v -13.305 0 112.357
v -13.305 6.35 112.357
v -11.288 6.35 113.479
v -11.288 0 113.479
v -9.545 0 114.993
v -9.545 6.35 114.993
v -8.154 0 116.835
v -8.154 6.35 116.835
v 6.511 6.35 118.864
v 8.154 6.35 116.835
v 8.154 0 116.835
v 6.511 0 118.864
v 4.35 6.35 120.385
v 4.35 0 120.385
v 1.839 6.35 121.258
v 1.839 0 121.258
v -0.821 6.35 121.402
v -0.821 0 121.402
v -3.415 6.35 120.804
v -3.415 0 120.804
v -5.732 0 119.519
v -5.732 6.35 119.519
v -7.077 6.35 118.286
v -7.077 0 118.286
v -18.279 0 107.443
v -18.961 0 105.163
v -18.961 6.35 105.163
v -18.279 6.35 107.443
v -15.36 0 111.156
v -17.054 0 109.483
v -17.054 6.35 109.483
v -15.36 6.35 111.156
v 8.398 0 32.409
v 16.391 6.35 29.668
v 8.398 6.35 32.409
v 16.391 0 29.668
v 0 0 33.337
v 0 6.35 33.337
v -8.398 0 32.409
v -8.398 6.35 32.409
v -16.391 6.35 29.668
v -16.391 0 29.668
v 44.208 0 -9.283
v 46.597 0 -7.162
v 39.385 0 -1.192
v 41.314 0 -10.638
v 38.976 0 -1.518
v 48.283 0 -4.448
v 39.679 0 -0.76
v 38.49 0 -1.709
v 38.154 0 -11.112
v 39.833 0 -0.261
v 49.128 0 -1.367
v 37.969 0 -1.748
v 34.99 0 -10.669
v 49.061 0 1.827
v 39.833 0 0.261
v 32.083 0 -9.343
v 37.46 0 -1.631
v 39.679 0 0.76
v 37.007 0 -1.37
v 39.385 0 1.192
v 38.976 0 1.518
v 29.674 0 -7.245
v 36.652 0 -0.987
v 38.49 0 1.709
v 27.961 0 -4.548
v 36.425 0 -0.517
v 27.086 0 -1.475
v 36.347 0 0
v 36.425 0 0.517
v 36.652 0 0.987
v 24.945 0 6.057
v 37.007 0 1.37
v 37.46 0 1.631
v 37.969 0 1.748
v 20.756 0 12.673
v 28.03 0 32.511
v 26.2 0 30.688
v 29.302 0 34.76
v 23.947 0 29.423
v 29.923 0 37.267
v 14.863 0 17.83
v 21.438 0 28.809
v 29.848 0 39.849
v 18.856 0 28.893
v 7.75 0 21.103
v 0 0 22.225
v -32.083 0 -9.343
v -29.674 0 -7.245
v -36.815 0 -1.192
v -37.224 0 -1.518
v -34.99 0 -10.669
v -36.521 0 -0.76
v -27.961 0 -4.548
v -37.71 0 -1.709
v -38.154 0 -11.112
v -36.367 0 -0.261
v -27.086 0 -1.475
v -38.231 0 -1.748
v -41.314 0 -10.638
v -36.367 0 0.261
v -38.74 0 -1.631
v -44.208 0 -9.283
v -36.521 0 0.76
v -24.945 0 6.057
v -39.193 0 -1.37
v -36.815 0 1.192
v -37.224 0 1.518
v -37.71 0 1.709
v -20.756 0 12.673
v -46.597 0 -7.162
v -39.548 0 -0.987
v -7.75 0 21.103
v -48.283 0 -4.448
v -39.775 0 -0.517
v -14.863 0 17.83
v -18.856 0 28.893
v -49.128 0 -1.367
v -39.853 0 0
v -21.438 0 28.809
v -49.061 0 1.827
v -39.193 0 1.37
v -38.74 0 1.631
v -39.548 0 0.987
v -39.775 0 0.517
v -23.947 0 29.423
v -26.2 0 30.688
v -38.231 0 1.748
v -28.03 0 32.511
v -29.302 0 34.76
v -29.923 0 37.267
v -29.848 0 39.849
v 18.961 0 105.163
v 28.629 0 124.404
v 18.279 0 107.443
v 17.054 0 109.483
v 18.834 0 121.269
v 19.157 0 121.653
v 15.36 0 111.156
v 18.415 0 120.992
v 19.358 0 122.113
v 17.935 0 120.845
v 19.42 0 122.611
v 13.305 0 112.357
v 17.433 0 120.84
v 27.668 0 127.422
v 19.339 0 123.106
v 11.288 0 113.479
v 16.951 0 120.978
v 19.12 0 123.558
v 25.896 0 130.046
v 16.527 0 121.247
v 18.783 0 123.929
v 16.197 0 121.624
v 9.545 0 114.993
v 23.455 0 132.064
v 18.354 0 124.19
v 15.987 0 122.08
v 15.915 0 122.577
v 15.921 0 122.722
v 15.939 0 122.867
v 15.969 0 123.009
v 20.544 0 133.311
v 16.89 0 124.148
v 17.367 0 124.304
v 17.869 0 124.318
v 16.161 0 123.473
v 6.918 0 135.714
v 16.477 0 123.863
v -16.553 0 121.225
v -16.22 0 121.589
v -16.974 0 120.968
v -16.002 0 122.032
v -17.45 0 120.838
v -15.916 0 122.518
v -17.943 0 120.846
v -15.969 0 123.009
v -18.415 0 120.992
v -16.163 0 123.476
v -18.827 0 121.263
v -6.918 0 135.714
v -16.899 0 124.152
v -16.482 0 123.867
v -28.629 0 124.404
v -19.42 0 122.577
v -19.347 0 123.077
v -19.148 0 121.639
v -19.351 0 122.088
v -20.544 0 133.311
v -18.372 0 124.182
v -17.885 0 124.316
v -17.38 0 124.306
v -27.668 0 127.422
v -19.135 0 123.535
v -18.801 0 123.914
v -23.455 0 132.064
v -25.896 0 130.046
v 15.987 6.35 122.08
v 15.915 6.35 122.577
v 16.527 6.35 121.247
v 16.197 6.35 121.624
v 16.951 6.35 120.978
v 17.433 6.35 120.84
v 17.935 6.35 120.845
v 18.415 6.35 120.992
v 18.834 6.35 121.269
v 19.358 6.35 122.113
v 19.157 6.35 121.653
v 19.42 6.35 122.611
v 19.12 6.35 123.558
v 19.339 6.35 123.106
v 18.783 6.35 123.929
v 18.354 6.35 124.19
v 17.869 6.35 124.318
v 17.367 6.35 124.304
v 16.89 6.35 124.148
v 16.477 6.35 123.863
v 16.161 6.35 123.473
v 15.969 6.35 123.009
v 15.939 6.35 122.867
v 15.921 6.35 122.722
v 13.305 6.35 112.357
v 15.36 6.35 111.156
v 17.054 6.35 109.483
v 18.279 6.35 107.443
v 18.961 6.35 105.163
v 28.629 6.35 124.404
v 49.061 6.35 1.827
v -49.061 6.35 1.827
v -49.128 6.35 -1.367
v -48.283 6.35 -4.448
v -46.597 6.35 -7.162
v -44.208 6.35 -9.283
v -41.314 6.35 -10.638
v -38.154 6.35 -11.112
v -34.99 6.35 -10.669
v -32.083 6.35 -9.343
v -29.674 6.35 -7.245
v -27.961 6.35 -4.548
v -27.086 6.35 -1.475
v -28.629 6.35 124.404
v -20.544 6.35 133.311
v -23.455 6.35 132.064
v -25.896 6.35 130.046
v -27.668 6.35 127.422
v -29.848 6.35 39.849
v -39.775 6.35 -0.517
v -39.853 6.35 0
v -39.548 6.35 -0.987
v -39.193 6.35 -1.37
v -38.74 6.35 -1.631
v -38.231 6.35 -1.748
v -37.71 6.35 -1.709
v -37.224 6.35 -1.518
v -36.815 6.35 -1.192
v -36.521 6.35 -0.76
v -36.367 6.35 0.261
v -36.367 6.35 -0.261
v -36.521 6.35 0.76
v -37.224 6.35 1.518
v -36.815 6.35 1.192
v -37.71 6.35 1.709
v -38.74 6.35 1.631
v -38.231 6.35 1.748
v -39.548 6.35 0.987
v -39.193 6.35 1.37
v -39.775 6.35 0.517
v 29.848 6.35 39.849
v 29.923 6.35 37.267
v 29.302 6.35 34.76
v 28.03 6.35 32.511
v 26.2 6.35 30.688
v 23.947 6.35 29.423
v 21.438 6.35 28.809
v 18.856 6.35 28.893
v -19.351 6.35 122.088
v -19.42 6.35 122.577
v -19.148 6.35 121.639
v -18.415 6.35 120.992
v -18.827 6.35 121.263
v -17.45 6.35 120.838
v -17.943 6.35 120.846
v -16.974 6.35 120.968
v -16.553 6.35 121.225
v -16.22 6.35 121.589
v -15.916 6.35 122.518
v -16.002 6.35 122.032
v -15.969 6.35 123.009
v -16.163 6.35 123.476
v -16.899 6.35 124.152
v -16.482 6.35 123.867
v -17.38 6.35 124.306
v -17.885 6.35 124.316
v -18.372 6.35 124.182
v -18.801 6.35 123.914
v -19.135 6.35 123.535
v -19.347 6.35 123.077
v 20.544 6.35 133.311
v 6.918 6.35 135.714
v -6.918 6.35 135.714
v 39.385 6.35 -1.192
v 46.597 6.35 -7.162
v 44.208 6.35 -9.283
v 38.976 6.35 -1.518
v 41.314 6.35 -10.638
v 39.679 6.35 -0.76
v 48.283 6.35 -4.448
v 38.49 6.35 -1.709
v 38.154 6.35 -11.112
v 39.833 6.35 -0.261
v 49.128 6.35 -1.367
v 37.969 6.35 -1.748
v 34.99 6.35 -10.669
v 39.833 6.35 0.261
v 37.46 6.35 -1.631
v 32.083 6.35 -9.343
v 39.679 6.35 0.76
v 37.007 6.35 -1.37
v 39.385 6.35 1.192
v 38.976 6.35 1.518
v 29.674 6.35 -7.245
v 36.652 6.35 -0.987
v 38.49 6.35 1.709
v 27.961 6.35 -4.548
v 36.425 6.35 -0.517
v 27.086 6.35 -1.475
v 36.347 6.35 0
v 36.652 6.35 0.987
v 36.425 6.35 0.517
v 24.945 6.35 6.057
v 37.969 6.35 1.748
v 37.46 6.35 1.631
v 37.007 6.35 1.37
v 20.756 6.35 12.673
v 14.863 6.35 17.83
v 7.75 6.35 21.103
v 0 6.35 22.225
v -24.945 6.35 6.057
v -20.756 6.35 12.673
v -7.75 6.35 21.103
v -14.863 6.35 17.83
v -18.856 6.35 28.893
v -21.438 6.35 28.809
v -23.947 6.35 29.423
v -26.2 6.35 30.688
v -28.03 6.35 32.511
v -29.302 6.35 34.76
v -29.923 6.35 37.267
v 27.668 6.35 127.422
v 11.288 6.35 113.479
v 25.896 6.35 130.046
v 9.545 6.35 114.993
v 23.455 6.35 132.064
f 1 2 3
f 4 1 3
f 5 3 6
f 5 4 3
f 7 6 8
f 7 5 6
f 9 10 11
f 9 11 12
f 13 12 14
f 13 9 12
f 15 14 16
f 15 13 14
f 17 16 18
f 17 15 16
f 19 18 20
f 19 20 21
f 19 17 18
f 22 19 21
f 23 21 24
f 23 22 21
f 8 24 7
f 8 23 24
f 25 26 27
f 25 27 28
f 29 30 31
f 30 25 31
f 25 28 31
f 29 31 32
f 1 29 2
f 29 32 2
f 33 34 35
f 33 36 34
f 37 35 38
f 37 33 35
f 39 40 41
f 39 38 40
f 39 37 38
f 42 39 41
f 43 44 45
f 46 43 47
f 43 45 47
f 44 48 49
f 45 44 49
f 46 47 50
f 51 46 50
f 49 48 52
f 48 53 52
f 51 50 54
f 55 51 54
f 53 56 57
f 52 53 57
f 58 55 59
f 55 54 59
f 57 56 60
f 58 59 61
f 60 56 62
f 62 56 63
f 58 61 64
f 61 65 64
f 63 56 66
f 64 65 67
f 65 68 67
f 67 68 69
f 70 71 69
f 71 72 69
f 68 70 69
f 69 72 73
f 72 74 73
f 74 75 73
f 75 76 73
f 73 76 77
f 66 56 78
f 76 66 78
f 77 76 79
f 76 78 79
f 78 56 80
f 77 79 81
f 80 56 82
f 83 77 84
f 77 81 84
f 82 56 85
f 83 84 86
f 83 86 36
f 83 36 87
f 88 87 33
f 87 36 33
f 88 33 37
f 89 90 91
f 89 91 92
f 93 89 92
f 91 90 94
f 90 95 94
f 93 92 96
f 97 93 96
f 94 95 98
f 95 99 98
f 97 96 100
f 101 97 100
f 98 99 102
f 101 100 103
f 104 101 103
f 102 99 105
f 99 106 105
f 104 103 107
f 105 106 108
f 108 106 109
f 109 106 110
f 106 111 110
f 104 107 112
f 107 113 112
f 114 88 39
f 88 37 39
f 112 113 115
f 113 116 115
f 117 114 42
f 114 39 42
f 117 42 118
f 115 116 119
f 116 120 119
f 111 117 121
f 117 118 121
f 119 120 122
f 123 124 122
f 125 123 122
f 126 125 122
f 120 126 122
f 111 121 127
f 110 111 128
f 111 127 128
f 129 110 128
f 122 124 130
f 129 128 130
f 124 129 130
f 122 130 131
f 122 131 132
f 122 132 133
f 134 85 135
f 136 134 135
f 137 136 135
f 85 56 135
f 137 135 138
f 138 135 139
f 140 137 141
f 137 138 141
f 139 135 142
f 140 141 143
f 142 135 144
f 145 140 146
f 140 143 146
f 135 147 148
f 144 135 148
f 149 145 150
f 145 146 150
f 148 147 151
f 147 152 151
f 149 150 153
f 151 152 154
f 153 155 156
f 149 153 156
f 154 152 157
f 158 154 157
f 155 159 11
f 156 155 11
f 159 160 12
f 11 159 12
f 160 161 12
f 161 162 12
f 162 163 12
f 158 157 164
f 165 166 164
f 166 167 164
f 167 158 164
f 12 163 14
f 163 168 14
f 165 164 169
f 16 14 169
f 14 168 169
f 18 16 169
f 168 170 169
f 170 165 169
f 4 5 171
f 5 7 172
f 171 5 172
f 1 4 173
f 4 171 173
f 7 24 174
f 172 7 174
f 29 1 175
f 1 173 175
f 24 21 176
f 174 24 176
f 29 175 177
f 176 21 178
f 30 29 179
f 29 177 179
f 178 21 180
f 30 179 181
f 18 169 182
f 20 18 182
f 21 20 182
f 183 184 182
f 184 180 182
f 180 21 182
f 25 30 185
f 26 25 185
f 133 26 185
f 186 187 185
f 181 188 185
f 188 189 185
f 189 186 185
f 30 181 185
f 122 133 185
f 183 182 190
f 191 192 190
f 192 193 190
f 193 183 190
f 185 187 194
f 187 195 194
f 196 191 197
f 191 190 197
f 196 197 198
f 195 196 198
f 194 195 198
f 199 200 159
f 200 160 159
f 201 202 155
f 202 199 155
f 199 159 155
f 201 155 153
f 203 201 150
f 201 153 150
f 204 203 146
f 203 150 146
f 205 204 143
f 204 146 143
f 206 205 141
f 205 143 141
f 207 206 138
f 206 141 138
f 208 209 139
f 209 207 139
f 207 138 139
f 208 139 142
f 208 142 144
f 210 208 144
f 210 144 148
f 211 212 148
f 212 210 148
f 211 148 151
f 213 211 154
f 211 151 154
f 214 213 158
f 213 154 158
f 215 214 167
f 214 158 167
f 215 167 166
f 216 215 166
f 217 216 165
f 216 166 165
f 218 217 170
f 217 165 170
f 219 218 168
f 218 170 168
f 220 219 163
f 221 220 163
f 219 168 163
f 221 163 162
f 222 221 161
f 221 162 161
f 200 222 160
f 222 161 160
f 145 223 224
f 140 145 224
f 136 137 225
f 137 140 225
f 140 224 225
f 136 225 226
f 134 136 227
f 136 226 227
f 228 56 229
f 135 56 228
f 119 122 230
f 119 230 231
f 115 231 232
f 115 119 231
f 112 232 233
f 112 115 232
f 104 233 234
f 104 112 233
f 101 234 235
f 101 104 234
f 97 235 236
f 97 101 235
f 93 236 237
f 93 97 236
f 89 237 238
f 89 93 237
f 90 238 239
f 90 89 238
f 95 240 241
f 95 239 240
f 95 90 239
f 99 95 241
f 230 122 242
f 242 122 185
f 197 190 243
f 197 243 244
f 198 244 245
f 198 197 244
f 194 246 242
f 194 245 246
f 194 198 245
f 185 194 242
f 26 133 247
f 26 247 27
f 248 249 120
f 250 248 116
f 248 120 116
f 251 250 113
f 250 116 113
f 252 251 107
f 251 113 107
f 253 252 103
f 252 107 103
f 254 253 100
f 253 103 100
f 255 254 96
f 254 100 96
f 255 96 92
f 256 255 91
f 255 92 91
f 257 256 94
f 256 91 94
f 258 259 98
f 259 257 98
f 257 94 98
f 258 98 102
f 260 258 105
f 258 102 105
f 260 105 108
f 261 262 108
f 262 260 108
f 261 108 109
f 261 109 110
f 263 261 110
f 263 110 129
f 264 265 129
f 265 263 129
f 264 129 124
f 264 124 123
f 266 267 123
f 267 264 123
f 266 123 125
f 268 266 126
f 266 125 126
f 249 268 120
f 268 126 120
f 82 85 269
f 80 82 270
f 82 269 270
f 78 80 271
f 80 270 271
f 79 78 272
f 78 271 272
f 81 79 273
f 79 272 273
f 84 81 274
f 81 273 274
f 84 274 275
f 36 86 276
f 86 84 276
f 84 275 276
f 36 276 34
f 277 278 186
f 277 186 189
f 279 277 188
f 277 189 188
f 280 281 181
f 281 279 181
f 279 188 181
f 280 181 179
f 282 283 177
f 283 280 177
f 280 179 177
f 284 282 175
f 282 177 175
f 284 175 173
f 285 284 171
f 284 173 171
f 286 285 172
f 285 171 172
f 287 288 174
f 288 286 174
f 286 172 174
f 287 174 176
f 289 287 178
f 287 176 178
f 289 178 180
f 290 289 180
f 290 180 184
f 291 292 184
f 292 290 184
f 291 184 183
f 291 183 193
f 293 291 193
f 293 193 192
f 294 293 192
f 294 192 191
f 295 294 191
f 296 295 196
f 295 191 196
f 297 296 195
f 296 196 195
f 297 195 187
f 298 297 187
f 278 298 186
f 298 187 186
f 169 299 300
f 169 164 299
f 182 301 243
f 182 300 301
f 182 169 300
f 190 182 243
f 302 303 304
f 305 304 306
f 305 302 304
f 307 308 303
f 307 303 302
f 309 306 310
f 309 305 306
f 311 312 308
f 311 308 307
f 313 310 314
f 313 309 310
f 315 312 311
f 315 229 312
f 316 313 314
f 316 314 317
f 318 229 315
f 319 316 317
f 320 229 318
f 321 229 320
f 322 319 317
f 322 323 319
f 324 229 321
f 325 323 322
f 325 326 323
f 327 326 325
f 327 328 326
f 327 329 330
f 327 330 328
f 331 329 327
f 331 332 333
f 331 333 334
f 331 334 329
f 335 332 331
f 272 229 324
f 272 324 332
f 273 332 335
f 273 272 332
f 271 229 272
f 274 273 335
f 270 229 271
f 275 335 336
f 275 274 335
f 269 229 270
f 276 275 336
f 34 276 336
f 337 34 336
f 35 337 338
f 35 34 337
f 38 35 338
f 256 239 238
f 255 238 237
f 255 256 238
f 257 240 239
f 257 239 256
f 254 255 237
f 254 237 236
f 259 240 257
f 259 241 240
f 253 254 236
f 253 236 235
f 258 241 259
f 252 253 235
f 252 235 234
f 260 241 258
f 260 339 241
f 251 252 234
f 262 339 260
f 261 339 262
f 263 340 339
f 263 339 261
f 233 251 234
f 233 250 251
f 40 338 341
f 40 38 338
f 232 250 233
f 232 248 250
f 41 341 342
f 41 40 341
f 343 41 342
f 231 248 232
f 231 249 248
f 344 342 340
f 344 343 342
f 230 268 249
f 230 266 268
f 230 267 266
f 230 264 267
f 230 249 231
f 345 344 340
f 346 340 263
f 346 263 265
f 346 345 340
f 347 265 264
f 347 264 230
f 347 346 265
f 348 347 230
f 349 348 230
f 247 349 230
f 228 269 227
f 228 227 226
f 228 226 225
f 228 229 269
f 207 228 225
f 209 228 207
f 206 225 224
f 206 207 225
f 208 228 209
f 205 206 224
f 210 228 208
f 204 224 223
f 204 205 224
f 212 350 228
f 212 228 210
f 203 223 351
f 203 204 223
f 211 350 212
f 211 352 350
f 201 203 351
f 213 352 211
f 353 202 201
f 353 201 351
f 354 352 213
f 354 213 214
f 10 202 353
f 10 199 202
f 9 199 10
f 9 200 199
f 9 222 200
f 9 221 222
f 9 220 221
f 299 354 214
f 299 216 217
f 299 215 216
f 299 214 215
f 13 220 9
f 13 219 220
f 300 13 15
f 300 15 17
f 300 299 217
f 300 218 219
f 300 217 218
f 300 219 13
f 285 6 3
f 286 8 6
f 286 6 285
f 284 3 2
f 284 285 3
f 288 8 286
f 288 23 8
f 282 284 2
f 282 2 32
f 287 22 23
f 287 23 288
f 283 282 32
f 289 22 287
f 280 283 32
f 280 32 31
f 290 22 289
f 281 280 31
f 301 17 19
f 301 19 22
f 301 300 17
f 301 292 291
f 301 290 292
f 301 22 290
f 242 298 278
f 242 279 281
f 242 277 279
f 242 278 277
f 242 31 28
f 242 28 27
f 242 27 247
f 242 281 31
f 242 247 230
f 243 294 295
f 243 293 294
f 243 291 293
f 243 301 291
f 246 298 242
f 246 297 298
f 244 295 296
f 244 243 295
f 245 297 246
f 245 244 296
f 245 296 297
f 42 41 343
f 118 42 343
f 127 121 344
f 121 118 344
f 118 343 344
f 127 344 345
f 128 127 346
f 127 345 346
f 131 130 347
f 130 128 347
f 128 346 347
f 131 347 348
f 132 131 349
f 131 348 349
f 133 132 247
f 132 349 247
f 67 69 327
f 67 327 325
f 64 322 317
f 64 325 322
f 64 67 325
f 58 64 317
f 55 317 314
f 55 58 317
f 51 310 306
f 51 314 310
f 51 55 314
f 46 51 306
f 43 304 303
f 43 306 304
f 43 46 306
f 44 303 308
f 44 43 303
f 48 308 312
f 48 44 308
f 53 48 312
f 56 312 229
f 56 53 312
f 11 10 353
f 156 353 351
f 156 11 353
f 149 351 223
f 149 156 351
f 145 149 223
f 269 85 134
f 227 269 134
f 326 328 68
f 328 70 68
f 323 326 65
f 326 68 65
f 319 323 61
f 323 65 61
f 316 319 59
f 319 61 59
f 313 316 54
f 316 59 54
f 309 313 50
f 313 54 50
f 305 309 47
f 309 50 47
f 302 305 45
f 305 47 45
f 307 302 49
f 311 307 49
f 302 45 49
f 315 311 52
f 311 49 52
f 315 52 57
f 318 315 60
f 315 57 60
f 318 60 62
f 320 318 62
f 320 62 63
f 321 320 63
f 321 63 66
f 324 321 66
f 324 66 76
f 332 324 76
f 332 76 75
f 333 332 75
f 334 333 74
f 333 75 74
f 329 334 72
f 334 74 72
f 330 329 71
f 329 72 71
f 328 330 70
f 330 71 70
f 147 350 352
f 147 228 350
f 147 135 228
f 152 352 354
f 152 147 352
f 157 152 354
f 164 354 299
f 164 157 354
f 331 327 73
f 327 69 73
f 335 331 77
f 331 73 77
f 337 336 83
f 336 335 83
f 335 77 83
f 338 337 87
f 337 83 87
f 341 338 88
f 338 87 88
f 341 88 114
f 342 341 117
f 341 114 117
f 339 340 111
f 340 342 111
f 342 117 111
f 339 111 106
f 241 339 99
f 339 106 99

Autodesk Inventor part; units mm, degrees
ref_plane "YZ Plane" through (0, 0, 0) normal (1, 0, 0) x (0, 1, 0)
ref_plane "XZ Plane" through (0, 0, 0) normal (0, 1, 0) x (-1, 0, 0)
ref_plane "XY Plane" through (0, 0, 0) normal (0, 0, 1) x (1, 0, 0)
sketch "Sketch1" plane through (0, 0, 0) normal (0, 1, 0) x (-1, 0, 0)
  circle A0 centre (0, 0) radius 38.1 construction
  line L0 (38.1, 0) -> (-38.1, 0) construction
  circle A1 centre (38.1, 0) radius 1.7526
  circle A2 centre (-38.1, 0) radius 1.7526
  circle A3 centre (38.1, 0) radius 7.9375 construction
  circle A4 centre (-38.1, 0) radius 7.9375 construction
  line L1 (0, 0) -> (0, -38.1) construction
  circle A5 centre (0, 56.6406) radius 76.2 construction
  circle A6 centre (-17.6676, 122.5771) radius 7.9375 construction
  circle A7 centre (-17.6676, 122.5771) radius 1.7526
  circle A8 centre (-38.1, 0) radius 11.1125
  circle A9 centre (38.1, 0) radius 11.1125
  circle A10 centre (-17.6676, 122.5771) radius 11.1125
  line L2 (0, 56.6406) -> (0, 132.8406) construction
  line L3 (0, 56.6406) -> (-17.6676, 122.5771) construction
  line L4 (-49.0613, 1.8271) -> (-28.6289, 124.4043)
  line L5 (-38.1, 0) -> (-17.6676, 122.5771) construction
  circle A11 centre (17.6676, 122.5771) radius 7.9375 construction
  circle A12 centre (17.6676, 122.5771) radius 1.7526
  circle A13 centre (17.6676, 122.5771) radius 11.1125
  line L6 (49.0613, 1.8271) -> (28.6289, 124.4043)
  line L7 (38.1, 0) -> (17.6676, 122.5771) construction
  arc A14 (20.5438, 133.311) -> (-20.5438, 133.311) centre (0, 56.6406) ccw
  arc A15 (-44.3023, -9.2206) -> (44.3023, -9.2206) centre (0, 56.6406) ccw
  arc A16 (17.6676, 122.5771) -> (-17.6676, 122.5771) centre (0, 56.6406) ccw
  arc A17 (-38.1, 0) -> (38.1, 0) centre (0, 56.6406) ccw
  line L8 (-34.7257, 10.5878) -> (-17.9101, 111.4673)
  line L9 (34.7257, 10.5878) -> (17.9101, 111.4673)
  circle A18 centre (0, 0) radius 19.5594
  arc A19 (27.0858, -1.4751) -> (-27.0858, -1.4751) centre (0, -5.1027) ccw
  circle A20 centre (0, 0) radius 22.225 construction
  arc A21 (38.1, 0) -> (-38.1, 0) centre (0, -5.1027) ccw
  point P0 (49.0613, 1.8271)
  point P1 (6.7353, 124.57)
  point P2 (17.9101, 111.4673)
  point P3 (28.4052, -5.4312)
  point P4 (-28.4052, -5.4312)
  point P5 (-6.7353, 124.57)
  point P6 (17.1322, -9.437)
  point P7 (-17.1322, -9.437)
  point P8 (34.5232, 11.8029)
  point P9 (-34.5232, 11.8029)
  dimension "d5" = 152.4
  dimension "d0" = 76.2
  dimension "d1" = 3.5052
  dimension "d2" = 3.5052
  dimension "d3" = 15.875
  dimension "d4" = 15.875
  dimension "d8" = 15.875
  dimension "d9" = 3.5052
  dimension "d11" = 15
  dimension "d12" = 79.375
  dimension "d13" = 79.375
  dimension "d17" = 11.1125
  dimension "d18" = 11.1125
  dimension "d20" = 12.7
  dimension "d21" = 44.45
  dimension "d22" = 11.1125
extrude "Extrusion1" add sketch "Sketch1" along normal blind 6.35 contours A1 A21 A9 A17 | A1 A17 A9 A21 | A21 L9 A13 L6 A9 | A9 L9 A21 | A9 A19 A8 L8 A21 L9 | A13 | A21 A8 L4 A10 L8 | L8 A8 A21 | A8 A17 A2 A21 | A8 A21 A2 A17 | A13 A16 A10 A14 | A10
fillet "Fillet1" radius 9.525 6 edges at (17.9101, 3.175, 111.4673) (6.7353, 3.175, 124.57) (-6.7353, 3.175, 124.57) (-17.9101, 3.175, 111.4673) (-34.5232, 3.175, 11.8029) (34.5232, 3.175, 11.8029)
equation "\"d1\" = d2"
equation "\"d9\" = d2"
equation "\"d13\" = d12"
properties part number "Upright - Lower" material "Aluminum 6061"
